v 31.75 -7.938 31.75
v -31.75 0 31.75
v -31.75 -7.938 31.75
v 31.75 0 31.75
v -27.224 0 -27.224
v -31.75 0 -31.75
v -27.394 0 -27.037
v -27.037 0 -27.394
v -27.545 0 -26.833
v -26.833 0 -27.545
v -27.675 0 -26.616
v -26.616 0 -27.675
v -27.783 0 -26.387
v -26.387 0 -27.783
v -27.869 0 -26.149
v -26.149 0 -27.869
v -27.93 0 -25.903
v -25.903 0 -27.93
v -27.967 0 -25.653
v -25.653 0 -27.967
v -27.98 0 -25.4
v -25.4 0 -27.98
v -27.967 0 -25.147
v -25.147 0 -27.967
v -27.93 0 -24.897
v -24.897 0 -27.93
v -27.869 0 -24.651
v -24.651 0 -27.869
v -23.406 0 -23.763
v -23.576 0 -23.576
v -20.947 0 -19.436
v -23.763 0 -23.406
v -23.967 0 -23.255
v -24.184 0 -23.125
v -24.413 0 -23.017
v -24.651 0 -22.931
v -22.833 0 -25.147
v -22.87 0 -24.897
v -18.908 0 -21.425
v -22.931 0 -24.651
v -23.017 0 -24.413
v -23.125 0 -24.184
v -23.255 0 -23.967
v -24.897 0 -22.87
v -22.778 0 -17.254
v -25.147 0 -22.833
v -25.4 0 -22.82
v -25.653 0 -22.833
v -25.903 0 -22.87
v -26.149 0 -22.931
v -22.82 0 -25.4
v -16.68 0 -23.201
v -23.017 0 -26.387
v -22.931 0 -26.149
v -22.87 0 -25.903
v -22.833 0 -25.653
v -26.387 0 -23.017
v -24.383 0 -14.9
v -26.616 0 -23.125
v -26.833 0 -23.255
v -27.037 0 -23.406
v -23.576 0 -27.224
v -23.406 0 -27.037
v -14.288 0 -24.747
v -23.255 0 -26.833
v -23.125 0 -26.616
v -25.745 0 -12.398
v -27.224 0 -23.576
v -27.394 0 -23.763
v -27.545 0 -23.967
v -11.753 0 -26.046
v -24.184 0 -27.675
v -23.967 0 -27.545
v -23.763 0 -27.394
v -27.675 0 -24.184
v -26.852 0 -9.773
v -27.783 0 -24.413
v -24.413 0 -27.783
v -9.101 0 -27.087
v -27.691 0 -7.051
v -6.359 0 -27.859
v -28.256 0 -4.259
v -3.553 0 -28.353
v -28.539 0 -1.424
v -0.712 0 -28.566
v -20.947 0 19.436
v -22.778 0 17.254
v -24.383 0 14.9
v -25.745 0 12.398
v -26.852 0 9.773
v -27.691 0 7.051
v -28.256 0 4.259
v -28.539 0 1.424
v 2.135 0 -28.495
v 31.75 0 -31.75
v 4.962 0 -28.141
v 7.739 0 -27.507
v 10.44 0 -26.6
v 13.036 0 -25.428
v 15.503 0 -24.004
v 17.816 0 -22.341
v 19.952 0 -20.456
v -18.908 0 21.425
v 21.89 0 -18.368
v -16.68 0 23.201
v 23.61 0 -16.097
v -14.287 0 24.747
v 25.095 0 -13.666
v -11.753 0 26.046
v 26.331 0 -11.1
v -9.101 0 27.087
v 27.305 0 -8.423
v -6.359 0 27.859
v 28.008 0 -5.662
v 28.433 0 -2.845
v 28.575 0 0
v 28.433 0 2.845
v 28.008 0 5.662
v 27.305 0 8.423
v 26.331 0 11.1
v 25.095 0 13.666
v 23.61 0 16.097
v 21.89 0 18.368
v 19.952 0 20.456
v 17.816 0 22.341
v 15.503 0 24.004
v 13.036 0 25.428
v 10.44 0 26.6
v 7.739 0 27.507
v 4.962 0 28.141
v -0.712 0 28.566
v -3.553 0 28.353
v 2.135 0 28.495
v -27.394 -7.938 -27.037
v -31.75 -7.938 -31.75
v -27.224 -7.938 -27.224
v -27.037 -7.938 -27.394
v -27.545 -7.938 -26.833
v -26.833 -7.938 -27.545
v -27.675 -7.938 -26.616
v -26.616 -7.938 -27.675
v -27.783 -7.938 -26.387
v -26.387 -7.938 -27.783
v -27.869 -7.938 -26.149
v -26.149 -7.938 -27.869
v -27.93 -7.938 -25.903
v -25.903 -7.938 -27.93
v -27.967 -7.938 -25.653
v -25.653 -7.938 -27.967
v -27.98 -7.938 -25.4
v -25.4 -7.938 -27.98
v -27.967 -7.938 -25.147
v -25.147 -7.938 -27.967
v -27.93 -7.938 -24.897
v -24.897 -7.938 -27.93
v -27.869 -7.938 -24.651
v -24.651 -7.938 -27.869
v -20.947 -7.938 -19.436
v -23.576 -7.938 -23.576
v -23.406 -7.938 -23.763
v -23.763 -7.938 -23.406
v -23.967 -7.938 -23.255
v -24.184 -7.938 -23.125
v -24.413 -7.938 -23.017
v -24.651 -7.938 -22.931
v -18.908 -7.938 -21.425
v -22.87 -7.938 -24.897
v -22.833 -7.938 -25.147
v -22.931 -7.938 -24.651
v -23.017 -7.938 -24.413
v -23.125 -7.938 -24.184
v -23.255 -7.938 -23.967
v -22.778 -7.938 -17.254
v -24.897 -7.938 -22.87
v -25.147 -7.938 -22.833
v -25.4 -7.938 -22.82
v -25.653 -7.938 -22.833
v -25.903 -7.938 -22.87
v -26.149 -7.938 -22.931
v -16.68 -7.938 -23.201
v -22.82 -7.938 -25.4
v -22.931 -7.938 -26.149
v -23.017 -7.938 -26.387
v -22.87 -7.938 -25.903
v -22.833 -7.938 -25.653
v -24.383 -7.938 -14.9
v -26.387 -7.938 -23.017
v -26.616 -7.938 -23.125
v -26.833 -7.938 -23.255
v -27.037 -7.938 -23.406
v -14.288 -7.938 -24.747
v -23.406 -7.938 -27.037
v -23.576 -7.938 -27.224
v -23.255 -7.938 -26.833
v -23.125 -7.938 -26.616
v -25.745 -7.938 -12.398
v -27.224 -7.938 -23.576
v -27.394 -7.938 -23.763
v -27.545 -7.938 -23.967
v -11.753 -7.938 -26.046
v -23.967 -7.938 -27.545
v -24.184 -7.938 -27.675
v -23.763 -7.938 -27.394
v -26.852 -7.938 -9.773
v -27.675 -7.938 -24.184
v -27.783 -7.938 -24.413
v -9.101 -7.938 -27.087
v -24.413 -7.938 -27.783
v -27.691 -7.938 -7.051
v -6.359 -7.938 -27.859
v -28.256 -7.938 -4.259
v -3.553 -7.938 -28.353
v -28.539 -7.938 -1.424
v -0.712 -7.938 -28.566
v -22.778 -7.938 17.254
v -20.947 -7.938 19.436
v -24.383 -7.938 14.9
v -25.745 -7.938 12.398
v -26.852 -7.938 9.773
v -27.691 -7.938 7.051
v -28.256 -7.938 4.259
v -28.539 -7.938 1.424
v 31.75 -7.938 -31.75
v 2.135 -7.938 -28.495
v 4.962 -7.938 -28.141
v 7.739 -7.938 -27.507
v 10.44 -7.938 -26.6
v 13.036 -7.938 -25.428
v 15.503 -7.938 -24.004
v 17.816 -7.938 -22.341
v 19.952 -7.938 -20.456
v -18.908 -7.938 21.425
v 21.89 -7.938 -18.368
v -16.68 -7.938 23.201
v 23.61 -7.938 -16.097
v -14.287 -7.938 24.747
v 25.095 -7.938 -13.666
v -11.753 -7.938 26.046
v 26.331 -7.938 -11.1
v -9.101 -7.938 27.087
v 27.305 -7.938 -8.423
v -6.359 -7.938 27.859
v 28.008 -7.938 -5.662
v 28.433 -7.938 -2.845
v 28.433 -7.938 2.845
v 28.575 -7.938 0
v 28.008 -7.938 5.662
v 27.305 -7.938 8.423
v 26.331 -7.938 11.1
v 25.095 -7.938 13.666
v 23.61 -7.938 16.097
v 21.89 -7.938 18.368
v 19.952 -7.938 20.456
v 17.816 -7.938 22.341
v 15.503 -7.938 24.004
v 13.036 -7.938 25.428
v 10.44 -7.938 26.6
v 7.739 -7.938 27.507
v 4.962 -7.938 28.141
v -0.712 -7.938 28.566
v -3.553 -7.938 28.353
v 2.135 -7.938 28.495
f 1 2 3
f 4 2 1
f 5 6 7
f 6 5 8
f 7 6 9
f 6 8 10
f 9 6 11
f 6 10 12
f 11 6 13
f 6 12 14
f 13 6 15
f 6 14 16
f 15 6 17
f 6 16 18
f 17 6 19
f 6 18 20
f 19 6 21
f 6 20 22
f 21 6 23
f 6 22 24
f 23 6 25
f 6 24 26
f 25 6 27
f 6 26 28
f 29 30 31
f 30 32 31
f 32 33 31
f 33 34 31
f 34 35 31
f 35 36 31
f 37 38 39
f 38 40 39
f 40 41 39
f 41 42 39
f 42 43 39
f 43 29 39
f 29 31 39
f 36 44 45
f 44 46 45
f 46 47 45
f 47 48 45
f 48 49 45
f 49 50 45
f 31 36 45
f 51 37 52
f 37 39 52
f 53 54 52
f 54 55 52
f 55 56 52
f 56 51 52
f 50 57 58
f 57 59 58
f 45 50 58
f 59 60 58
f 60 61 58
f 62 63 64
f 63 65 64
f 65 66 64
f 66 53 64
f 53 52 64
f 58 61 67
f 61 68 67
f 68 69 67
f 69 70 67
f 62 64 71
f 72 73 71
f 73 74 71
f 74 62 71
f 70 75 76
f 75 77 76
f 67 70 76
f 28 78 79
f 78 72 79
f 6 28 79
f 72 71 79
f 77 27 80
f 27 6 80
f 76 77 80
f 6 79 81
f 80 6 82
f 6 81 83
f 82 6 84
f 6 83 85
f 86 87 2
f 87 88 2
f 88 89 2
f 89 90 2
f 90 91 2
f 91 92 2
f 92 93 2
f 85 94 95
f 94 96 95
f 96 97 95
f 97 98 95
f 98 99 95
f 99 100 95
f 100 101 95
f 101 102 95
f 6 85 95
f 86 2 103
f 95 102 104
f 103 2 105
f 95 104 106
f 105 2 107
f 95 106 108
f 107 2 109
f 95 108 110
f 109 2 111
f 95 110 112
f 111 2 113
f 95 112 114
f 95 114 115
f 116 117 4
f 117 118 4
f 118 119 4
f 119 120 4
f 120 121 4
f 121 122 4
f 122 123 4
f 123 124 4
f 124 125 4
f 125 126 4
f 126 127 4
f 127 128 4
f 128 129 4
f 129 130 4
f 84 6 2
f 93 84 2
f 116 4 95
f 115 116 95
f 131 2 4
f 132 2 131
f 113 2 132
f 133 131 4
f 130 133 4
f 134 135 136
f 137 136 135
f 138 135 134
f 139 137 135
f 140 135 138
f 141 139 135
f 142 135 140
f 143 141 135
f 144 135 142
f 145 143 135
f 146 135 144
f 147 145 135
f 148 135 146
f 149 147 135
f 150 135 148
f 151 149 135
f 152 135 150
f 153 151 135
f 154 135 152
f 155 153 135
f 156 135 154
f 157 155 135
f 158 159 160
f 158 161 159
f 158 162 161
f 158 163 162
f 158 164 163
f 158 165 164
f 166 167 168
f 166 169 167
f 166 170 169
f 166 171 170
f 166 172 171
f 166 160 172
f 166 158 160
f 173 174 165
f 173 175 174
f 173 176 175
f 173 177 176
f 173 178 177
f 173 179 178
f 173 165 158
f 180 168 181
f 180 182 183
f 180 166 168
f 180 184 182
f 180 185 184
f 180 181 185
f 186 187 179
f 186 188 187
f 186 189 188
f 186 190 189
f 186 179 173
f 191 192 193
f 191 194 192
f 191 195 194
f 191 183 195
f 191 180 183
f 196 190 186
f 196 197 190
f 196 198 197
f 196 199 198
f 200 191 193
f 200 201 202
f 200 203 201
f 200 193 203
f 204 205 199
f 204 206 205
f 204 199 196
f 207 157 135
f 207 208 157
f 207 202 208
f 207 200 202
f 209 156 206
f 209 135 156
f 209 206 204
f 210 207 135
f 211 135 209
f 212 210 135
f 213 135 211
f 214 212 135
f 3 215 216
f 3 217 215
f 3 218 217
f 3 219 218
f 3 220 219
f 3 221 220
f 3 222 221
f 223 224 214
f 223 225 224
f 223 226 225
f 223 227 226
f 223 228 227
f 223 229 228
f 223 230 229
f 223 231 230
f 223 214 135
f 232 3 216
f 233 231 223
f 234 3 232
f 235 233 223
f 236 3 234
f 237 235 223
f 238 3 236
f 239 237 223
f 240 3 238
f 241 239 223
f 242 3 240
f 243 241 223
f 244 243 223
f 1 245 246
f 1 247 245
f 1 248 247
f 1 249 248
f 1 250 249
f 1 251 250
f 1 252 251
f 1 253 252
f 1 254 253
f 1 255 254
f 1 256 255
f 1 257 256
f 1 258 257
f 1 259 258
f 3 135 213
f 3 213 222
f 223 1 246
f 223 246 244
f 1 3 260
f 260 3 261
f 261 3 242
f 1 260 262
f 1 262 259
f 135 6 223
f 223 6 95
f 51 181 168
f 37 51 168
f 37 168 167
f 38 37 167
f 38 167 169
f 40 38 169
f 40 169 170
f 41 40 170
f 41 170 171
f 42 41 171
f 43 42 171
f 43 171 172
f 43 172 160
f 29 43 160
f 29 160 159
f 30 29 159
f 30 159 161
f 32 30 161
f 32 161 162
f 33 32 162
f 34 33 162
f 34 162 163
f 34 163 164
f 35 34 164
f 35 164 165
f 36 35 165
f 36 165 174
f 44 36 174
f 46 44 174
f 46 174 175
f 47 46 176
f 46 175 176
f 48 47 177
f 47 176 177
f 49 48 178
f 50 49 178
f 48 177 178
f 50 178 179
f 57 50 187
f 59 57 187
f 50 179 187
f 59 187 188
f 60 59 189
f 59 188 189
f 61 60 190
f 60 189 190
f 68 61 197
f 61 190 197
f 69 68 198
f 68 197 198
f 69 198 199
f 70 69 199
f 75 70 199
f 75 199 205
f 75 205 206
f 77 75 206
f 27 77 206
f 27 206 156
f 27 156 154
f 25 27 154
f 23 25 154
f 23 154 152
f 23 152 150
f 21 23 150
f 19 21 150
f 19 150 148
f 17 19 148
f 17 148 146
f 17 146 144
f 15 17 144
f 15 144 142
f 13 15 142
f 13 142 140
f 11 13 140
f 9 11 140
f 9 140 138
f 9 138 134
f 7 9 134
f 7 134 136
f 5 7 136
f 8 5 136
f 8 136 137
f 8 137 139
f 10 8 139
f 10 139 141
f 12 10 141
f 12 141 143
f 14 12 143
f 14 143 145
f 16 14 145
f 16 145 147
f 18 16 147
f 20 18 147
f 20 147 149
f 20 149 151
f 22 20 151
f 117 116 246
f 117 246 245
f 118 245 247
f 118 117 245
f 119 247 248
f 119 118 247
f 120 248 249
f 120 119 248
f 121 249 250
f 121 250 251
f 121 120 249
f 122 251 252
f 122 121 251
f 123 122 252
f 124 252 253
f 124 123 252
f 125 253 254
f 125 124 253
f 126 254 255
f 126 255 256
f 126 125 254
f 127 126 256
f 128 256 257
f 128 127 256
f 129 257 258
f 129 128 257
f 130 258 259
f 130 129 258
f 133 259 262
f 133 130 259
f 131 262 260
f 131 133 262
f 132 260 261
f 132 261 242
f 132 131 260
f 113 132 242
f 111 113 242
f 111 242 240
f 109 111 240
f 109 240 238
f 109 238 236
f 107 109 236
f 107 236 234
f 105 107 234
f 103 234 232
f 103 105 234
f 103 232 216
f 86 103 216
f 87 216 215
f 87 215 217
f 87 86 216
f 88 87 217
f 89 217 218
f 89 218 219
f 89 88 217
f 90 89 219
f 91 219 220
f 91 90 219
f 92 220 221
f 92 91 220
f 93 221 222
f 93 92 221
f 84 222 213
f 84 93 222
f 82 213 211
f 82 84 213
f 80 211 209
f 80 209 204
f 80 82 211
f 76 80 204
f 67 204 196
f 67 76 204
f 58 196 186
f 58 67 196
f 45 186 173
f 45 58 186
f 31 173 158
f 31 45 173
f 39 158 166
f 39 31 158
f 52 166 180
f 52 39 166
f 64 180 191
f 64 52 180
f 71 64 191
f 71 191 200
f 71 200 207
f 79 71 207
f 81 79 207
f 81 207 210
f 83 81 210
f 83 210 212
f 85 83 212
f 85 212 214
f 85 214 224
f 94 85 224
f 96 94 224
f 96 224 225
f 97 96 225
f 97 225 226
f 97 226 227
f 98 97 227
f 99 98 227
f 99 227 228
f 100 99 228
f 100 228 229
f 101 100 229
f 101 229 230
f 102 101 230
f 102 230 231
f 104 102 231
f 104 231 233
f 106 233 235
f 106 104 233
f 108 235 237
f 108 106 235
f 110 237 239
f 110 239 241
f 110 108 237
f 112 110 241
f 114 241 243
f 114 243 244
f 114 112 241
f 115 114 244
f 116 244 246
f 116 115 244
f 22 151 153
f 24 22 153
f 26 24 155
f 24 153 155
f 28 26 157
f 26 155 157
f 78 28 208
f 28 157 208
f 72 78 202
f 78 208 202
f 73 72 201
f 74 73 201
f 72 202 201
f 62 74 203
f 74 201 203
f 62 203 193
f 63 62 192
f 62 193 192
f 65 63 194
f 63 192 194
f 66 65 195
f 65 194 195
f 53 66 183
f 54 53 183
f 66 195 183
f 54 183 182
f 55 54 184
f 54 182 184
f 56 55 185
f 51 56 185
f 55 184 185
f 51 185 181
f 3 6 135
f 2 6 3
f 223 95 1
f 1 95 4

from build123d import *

# Parameters (mm, degrees)
F0_W     = 63.5
F0_H     = 63.5
F0_R     = 28.575
F1_DEPTH = 7.9375
F3_DEPTH = 25.4


# Not quite as in the source:
# - a length typed as a fraction of an inch, garbled in the dataset ("3 / 203.2 mm" for 3/8 in), is restored


with BuildPart() as f1:
    # F0 (on Front) → F1 (new body)
    with BuildSketch(Plane.XZ):
        Rectangle(F0_W, F0_H)
        Circle(F0_R, mode=Mode.SUBTRACT)
    extrude(amount=F1_DEPTH)

    # F2 (on face) → F3 (cut)
    with BuildSketch(Plane.XZ.offset(7.9375)):
        with BuildLine():
            ThreePointArc((-22.8203125, -25.4), (-27.2241145246, -23.5758854754), (-25.4, -27.9796875))
            ThreePointArc((-25.4, -27.9796875), (-23.5758854754, -27.2241145246), (-22.8203125, -25.4))
        make_face()
    extrude(amount=-F3_DEPTH, mode=Mode.SUBTRACT)


solid = f1.part
